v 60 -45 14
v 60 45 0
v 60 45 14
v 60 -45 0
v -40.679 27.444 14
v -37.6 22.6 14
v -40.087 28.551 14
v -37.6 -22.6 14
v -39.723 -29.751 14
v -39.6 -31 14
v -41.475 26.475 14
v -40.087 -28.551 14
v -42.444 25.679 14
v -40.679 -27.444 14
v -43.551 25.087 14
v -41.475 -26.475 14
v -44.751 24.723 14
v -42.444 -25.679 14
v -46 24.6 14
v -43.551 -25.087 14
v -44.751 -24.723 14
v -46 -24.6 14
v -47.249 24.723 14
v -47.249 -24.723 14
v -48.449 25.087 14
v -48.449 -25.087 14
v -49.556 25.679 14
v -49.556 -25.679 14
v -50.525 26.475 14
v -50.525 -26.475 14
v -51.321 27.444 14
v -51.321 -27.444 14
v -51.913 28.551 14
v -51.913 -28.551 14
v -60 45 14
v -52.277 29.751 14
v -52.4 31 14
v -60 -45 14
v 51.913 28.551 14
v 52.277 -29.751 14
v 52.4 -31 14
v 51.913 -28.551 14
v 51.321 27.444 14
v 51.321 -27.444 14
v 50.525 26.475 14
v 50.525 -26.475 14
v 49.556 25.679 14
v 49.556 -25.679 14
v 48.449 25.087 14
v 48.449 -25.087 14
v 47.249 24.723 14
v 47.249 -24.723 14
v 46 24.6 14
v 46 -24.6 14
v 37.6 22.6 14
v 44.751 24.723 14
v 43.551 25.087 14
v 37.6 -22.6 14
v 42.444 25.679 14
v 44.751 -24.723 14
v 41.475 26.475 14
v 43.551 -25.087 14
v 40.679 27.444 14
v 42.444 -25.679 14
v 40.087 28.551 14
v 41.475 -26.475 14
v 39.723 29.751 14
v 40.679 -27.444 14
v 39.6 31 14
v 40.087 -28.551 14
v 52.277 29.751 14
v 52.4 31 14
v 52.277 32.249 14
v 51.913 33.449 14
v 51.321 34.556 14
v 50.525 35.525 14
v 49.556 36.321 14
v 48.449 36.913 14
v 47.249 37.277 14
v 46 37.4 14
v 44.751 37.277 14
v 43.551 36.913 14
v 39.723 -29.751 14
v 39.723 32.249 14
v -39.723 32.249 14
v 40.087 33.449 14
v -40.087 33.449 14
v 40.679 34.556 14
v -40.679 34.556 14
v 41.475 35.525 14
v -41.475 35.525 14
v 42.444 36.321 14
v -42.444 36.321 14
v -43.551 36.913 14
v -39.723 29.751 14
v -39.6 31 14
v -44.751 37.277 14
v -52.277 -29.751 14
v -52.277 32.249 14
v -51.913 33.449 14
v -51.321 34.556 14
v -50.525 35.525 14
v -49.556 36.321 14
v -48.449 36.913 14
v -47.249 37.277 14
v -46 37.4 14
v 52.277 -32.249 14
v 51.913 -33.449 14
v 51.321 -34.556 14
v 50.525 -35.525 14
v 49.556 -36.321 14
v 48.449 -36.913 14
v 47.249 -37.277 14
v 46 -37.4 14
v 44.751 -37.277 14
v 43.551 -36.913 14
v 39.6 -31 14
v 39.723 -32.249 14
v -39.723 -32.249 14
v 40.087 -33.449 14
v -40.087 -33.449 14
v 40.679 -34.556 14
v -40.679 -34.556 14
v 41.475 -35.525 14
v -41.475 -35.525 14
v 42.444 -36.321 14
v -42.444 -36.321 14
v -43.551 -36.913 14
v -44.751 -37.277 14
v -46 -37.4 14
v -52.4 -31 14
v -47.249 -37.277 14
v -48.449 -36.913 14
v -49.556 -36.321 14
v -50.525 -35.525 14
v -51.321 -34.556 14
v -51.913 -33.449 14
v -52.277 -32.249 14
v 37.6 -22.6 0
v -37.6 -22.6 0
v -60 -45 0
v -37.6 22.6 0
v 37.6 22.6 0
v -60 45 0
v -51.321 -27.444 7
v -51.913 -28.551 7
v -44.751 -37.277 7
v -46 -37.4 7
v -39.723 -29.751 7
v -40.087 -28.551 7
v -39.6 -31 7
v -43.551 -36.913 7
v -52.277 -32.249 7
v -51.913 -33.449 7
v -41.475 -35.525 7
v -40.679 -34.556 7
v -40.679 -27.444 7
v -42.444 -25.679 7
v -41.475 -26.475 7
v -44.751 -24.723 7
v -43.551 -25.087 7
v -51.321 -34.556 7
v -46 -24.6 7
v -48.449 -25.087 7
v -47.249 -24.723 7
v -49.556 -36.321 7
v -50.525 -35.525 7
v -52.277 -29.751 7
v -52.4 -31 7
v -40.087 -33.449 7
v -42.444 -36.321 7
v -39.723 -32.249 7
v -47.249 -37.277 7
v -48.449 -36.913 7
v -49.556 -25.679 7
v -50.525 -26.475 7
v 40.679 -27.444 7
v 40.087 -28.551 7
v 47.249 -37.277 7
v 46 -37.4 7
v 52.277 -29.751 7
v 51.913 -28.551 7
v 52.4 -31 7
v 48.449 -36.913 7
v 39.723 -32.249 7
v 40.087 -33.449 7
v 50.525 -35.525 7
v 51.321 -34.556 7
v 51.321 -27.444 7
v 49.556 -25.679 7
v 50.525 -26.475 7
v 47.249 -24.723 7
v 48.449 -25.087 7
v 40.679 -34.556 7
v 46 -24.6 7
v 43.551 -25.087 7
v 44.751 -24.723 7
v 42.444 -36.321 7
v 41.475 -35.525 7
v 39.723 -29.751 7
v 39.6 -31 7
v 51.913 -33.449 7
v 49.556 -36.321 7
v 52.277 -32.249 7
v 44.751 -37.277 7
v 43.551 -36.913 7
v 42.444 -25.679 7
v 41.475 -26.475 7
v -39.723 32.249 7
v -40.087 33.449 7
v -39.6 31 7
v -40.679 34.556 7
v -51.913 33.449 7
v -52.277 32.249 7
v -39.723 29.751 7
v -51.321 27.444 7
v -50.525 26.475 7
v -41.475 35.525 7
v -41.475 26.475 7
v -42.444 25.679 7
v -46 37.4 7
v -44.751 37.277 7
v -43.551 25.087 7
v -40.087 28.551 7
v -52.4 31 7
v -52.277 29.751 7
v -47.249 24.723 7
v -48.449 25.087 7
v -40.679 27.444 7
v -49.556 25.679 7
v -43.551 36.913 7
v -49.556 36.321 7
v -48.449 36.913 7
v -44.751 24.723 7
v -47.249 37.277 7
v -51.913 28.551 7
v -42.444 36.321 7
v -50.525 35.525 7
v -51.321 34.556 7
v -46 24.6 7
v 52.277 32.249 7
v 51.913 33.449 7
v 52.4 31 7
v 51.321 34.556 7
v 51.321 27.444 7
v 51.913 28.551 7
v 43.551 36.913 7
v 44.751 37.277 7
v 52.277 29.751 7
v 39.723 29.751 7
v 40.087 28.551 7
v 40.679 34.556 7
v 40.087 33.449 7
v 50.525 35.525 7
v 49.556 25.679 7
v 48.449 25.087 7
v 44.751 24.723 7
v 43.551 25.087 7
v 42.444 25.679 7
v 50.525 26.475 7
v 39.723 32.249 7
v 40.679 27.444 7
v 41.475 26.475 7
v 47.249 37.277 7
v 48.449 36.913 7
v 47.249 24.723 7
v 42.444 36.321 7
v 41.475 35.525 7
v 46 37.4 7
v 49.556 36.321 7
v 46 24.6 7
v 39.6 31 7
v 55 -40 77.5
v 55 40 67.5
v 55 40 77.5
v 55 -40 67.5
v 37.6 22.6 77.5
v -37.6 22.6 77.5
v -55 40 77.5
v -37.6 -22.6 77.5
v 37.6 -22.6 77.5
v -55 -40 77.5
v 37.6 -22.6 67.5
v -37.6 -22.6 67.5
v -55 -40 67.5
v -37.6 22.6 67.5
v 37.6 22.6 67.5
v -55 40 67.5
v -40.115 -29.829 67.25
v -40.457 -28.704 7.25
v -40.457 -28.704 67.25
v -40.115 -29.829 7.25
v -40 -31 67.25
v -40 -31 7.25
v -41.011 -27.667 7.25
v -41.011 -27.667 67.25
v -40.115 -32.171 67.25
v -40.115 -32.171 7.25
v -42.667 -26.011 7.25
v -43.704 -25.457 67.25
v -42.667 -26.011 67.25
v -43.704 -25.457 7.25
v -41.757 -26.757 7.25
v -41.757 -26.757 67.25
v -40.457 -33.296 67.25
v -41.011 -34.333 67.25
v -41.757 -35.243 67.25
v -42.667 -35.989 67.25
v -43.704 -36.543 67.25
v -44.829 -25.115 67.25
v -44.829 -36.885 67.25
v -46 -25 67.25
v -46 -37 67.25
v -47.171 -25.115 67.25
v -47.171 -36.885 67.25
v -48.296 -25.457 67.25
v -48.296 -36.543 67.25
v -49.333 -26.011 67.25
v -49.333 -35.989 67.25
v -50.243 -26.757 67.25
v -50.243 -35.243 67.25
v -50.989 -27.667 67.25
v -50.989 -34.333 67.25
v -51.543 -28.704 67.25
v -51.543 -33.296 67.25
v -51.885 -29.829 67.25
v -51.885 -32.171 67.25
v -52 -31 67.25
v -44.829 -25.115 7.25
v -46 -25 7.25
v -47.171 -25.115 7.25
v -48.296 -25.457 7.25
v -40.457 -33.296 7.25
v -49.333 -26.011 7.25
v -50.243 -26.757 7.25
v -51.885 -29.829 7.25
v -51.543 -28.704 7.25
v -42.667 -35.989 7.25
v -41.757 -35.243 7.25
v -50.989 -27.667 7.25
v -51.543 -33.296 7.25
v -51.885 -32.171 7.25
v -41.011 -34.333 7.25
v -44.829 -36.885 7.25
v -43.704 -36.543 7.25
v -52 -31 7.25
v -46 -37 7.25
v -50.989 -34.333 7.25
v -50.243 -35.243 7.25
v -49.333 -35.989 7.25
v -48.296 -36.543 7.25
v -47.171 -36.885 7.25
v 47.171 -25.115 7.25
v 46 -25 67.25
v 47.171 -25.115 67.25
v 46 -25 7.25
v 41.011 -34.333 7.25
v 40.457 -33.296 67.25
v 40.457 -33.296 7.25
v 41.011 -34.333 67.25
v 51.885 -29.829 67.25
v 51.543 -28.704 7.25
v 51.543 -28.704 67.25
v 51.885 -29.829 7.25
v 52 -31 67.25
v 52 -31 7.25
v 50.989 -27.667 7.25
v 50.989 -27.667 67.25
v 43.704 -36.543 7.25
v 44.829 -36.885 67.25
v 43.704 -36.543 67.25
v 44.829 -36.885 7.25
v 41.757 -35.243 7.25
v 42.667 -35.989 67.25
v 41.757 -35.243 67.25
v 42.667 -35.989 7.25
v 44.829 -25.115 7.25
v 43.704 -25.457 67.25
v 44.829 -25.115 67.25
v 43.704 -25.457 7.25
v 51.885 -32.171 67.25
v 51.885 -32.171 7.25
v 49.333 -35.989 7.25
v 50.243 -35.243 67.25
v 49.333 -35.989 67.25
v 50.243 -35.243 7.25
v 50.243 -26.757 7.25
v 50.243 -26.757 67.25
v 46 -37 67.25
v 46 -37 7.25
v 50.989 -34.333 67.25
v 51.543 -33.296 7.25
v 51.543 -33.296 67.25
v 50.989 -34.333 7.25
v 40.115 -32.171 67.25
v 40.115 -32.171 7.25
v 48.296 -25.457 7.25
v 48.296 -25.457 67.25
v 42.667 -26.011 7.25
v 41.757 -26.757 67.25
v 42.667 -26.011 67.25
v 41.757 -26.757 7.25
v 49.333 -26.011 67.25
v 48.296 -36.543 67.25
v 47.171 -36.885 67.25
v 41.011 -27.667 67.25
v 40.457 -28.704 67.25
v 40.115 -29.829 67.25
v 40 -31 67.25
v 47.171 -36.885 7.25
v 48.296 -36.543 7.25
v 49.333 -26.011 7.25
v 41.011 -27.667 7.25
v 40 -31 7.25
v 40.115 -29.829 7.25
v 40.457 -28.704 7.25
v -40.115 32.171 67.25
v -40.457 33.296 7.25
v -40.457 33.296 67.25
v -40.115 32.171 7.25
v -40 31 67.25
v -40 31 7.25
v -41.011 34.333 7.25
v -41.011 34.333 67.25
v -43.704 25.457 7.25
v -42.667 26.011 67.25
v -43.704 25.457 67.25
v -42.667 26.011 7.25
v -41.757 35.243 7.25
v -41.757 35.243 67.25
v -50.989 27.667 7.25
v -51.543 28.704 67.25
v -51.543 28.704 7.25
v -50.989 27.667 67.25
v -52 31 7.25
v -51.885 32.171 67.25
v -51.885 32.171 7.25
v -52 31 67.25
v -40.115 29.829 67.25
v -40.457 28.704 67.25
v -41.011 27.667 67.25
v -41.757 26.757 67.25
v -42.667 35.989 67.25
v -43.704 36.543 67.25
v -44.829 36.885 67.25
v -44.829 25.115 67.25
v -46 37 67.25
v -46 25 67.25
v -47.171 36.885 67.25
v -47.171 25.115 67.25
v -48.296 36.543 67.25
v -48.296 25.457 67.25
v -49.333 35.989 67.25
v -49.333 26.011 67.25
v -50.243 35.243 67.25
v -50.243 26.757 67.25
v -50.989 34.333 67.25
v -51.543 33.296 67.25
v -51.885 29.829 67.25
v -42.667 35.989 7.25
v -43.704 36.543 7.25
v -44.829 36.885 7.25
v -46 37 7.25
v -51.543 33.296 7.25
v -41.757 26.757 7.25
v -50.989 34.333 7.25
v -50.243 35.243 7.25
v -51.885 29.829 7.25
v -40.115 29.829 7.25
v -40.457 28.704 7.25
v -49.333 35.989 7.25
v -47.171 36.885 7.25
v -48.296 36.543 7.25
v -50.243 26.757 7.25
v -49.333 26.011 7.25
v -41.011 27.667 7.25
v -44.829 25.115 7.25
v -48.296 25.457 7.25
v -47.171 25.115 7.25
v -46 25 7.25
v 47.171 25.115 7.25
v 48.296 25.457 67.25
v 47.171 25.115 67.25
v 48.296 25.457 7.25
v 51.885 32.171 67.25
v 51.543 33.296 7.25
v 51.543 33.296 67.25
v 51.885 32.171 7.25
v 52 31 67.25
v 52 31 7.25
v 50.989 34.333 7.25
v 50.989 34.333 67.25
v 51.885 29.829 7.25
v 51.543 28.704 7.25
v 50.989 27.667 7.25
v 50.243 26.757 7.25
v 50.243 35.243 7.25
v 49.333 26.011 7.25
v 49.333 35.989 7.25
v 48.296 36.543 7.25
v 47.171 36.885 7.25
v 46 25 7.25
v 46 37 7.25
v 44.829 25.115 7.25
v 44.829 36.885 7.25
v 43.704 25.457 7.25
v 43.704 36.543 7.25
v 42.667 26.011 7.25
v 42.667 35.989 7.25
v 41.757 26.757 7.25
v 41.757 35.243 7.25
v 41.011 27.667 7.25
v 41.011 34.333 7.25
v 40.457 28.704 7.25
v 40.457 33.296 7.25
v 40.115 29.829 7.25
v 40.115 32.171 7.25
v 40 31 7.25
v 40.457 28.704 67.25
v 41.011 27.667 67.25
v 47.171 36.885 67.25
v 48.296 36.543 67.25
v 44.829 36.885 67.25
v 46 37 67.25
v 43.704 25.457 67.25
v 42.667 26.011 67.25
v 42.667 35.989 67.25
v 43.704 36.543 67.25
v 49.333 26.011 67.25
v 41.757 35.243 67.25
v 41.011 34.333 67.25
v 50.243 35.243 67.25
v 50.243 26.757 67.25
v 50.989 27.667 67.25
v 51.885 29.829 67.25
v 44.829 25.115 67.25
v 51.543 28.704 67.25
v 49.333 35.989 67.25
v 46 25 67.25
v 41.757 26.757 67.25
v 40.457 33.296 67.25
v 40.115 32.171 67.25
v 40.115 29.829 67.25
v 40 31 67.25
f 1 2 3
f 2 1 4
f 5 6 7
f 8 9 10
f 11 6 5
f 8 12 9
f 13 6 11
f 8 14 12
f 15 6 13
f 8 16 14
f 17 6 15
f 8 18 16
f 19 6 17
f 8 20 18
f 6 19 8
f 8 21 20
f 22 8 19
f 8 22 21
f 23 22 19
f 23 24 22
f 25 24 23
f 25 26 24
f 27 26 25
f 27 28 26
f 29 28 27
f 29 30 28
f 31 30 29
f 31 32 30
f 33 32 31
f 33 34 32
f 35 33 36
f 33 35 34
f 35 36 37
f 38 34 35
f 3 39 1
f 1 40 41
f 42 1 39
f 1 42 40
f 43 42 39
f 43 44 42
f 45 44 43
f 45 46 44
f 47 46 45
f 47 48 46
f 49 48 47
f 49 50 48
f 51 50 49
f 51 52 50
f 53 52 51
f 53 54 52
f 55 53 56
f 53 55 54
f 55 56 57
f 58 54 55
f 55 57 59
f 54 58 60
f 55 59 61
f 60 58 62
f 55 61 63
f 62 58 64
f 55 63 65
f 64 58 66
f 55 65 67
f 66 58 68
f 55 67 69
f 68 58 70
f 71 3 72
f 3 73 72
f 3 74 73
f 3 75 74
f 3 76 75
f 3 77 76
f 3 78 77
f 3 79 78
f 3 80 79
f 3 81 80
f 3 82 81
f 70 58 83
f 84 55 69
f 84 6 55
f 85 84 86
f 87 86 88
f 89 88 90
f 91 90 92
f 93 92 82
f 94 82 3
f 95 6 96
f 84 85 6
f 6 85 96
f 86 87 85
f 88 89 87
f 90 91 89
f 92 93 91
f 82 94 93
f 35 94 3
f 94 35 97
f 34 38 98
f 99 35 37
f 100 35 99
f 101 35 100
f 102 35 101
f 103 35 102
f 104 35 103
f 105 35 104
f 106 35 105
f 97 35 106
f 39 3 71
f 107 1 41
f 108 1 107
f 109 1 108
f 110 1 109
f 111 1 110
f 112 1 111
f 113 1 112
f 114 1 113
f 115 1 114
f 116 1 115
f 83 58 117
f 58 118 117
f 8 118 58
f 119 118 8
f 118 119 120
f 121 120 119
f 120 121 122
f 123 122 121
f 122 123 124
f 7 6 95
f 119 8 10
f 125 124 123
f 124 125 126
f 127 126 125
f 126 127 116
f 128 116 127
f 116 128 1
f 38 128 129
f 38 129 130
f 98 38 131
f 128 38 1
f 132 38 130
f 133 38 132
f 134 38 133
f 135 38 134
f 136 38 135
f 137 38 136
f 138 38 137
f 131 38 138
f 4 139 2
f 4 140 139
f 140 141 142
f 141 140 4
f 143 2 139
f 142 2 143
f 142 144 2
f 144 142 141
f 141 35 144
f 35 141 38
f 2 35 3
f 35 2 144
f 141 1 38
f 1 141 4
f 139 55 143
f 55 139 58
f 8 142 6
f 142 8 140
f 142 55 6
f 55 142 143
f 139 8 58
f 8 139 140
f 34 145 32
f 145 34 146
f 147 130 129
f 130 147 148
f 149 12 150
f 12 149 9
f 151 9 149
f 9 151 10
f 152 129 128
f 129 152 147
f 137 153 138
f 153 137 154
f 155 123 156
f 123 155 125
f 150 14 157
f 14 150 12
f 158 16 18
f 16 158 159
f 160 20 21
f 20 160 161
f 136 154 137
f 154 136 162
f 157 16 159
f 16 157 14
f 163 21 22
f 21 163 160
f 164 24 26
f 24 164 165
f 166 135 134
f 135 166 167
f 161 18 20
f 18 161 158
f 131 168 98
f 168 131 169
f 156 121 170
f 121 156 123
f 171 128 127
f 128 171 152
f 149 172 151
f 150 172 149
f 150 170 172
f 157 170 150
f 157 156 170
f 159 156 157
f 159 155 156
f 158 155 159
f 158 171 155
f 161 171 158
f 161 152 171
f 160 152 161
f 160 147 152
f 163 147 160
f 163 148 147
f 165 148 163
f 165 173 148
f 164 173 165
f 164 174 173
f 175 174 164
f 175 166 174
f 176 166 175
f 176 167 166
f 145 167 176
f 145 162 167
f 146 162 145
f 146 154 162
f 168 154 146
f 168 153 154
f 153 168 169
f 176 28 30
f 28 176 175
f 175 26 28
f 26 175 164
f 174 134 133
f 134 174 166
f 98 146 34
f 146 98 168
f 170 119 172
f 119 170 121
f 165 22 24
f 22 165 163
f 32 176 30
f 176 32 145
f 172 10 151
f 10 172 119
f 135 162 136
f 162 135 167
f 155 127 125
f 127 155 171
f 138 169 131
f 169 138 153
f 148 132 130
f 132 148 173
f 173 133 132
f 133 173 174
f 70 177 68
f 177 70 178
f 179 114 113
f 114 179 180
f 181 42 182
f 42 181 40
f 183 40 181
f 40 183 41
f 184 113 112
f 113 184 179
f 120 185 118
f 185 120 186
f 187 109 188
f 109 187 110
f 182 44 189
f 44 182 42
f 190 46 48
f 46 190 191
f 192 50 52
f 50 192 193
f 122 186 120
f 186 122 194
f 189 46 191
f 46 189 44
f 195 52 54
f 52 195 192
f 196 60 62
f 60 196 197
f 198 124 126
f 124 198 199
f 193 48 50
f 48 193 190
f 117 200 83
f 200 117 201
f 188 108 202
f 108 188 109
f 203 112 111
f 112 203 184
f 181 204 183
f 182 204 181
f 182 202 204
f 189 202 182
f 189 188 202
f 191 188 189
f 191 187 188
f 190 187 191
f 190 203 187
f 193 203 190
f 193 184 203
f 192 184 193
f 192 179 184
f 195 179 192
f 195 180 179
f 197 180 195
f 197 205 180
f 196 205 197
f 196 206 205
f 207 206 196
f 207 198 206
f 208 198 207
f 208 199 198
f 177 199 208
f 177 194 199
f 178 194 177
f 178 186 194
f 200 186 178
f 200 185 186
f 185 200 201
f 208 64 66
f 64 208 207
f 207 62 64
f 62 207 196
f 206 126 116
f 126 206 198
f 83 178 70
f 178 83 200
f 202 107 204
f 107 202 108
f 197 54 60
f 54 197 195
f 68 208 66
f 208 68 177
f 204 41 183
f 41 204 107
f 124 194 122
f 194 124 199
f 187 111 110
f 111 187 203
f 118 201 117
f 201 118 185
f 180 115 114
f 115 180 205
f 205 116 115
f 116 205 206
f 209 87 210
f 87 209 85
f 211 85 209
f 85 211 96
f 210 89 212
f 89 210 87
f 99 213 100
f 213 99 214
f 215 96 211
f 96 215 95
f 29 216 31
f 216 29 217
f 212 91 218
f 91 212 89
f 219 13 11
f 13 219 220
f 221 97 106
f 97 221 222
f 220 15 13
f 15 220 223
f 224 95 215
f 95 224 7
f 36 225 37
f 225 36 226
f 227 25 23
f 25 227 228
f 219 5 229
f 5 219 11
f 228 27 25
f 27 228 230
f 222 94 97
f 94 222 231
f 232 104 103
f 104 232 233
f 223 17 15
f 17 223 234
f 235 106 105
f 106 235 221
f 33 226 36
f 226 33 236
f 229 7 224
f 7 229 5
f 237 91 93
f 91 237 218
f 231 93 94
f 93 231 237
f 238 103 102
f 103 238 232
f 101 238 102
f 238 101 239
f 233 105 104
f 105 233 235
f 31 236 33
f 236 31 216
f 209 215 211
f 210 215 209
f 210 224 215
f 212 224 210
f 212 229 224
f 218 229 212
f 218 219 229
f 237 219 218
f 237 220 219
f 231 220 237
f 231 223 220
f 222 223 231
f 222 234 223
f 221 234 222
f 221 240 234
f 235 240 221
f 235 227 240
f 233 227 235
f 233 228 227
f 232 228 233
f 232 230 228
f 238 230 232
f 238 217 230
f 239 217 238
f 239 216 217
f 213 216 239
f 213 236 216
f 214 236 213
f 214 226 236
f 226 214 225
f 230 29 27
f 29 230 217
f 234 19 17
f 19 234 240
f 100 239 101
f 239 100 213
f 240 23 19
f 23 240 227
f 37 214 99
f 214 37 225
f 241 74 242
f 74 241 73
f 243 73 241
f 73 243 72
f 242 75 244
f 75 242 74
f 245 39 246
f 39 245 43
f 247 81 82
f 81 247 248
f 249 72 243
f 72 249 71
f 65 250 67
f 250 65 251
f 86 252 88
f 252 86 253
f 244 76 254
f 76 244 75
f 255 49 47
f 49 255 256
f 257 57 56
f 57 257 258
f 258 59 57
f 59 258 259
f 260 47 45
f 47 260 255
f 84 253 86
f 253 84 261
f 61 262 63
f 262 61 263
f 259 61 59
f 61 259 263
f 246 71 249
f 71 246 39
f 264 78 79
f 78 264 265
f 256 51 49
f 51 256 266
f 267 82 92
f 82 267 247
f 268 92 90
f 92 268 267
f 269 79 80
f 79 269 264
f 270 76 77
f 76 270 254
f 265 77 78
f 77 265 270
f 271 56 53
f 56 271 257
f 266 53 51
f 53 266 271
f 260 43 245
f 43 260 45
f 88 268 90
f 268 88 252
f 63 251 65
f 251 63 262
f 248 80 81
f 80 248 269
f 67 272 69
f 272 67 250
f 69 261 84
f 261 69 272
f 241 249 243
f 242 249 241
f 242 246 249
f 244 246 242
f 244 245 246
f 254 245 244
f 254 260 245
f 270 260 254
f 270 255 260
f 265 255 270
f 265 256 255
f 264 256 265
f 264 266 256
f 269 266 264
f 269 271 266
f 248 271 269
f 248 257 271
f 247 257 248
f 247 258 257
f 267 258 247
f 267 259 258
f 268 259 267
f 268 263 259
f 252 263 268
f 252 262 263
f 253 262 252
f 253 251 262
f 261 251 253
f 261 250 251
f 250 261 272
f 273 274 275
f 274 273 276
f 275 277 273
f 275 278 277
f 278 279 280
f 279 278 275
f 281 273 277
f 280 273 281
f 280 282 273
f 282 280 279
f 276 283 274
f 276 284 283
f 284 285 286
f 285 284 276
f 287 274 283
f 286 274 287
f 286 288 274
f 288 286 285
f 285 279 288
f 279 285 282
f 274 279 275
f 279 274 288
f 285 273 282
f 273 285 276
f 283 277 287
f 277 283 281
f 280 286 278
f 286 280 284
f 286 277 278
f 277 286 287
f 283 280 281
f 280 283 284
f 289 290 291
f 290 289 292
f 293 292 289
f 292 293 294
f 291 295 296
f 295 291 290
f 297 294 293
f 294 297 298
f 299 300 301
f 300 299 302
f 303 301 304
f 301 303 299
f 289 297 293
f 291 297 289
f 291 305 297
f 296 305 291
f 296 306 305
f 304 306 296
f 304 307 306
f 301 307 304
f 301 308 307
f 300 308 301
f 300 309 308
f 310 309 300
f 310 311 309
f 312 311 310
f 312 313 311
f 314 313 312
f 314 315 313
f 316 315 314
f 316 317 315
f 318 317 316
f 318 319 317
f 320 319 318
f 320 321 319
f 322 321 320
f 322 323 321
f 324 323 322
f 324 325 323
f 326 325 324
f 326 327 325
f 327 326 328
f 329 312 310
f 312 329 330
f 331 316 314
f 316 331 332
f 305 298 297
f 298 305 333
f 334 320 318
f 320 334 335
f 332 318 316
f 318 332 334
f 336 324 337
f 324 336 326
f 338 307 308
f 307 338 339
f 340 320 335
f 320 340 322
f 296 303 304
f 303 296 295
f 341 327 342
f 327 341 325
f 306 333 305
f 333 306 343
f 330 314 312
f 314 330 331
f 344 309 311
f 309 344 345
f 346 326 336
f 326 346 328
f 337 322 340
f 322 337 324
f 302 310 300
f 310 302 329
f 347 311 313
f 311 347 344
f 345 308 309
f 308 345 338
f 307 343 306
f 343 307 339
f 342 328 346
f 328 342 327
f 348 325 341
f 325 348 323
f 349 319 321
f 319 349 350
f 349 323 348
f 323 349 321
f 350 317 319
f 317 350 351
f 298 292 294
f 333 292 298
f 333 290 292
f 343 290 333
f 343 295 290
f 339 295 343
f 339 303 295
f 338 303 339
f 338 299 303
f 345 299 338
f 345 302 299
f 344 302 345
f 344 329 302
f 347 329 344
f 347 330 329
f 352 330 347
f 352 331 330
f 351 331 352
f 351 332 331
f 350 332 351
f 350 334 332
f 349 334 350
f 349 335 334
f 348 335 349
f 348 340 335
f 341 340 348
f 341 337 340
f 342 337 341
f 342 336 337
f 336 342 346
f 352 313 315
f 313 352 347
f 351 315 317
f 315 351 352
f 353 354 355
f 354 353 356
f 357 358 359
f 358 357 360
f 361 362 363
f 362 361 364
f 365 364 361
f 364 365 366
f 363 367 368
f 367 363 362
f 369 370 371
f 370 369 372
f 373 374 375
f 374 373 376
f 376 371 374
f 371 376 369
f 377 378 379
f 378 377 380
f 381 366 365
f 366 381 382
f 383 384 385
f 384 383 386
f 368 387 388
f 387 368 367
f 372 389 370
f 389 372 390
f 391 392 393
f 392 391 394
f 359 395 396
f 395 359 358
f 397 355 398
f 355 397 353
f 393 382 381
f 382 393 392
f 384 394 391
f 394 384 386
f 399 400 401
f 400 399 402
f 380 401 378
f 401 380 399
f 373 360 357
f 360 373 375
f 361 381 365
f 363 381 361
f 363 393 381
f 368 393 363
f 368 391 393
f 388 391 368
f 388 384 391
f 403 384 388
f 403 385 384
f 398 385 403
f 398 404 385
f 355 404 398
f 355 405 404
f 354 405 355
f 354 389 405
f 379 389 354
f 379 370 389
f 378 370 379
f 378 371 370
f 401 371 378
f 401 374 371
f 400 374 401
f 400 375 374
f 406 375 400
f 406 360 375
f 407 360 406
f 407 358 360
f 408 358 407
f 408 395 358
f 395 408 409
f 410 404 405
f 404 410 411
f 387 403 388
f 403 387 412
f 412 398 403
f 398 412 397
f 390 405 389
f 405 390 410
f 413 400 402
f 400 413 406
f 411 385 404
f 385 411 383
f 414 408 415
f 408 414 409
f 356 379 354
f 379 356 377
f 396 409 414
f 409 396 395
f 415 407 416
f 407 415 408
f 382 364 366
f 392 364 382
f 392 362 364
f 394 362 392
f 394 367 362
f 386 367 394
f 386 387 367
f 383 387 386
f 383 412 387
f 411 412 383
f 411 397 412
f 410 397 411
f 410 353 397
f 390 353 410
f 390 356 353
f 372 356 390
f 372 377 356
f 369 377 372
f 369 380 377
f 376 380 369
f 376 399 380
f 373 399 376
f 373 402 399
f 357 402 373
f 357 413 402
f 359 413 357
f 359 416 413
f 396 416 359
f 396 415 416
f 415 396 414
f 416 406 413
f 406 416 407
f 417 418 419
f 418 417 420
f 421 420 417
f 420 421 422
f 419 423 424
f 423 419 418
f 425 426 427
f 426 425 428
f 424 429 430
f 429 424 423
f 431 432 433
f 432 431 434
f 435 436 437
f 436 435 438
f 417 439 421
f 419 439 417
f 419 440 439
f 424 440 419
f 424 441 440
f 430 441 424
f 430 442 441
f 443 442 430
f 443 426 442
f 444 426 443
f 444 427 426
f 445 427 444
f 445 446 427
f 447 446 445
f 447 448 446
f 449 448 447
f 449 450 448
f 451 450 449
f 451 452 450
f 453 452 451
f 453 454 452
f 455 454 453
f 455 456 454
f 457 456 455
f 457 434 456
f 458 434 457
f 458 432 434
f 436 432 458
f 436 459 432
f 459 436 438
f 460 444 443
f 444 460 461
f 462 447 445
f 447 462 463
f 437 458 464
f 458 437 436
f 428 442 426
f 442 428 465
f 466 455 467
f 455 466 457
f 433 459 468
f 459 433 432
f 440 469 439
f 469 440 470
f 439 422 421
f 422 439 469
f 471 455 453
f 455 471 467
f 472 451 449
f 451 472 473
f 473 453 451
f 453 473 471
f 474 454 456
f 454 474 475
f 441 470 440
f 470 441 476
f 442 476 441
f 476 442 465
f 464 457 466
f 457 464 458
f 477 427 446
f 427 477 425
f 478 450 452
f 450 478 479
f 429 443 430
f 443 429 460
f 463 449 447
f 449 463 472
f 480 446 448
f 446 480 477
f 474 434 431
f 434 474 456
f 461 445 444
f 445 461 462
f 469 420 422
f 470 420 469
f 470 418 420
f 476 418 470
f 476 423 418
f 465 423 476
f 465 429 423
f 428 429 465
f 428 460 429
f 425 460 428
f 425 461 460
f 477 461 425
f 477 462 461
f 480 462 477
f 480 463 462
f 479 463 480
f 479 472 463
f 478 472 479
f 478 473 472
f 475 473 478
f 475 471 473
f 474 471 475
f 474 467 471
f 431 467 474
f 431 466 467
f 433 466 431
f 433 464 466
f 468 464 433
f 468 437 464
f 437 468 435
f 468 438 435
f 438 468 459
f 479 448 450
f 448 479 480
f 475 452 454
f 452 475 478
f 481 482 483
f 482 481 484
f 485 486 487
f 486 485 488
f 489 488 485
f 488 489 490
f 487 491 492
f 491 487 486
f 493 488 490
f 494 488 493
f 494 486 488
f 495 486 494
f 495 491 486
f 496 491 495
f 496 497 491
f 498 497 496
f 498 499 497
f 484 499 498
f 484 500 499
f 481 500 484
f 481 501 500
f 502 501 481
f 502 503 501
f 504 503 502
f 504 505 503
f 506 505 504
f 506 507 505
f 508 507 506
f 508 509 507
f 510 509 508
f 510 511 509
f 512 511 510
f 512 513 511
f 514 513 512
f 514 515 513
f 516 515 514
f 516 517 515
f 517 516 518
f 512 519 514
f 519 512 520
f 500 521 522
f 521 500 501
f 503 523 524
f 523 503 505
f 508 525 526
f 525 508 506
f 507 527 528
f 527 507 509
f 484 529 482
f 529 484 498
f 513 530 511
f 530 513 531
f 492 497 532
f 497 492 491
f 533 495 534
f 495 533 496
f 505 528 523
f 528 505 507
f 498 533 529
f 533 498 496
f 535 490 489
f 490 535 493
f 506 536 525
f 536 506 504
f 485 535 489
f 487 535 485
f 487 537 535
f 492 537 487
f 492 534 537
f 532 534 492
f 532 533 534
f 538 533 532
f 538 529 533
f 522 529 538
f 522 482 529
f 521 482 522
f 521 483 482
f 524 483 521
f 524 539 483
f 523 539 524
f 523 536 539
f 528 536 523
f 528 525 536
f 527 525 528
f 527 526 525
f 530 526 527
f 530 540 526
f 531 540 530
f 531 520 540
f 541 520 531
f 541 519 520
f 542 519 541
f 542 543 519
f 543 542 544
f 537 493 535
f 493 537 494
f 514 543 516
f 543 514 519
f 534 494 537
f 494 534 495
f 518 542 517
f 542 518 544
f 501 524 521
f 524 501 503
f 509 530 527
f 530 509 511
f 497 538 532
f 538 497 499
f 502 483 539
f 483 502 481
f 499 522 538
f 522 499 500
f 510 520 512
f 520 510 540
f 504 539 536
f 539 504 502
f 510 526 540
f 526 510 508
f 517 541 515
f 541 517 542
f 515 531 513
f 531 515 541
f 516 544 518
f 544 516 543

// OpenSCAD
$fn = 32;

// ------------------------------------------------------------------------
// Frame cube: base 120 x 90 mm, posts 60 mm tall
// Every part is its own module, assembly() places every instance.
// ------------------------------------------------------------------------

// --- part 1 ---
module base_frame() {
  difference() {
    translate([-60, -45, 0]) cube([120, 90, 14]);
    translate([-37.6, -22.6, -1]) cube([75.2, 45.2, 16]);
    translate([-46, -31, 7]) cylinder(h = 8, d = 12.8);
    translate([46, -31, 7]) cylinder(h = 8, d = 12.8);
    translate([-46, 31, 7]) cylinder(h = 8, d = 12.8);
    translate([46, 31, 7]) cylinder(h = 8, d = 12.8);
  }
}

// --- part 2 ---
module corner_post() {
  cylinder(h = 60, d = 12);
}

// --- part 3 ---
module top_frame() {
  difference() {
    translate([-55, -40, 0]) cube([110, 80, 10]);
    translate([-37.6, -22.6, -1]) cube([75.2, 45.2, 12]);
  }
}

// --- assembly ---
module assembly() {
  color([0.80, 0.24, 0.20]) translate([0, 0, 0]) rotate([0, 0, 0]) base_frame();
  color([0.20, 0.45, 0.75]) translate([-46, -31, 7.25]) rotate([0, 0, 0]) corner_post();
  color([0.25, 0.62, 0.32]) translate([46, -31, 7.25]) rotate([0, 0, 0]) corner_post();
  color([0.92, 0.70, 0.18]) translate([-46, 31, 7.25]) rotate([0, 0, 0]) corner_post();
  color([0.58, 0.35, 0.70]) translate([46, 31, 7.25]) rotate([0, 0, 0]) corner_post();
  color([0.16, 0.66, 0.66]) translate([0, 0, 67.5]) rotate([0, 0, 0]) top_frame();
}

assembly();
